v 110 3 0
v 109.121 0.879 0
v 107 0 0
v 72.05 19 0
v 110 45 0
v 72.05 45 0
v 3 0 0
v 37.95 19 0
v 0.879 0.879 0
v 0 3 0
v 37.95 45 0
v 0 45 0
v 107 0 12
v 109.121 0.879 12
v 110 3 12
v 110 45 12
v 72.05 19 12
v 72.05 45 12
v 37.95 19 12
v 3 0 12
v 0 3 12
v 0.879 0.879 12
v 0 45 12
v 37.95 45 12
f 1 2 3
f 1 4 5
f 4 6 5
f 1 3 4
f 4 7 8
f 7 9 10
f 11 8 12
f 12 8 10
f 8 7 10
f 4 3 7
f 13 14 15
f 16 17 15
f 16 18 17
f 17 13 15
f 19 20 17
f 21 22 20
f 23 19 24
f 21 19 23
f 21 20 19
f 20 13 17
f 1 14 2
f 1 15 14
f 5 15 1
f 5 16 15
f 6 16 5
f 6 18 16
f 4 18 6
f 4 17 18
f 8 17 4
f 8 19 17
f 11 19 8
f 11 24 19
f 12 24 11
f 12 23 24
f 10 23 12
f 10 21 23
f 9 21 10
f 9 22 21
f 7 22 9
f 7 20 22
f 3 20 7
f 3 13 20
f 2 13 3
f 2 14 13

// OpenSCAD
$fn = 32;

// ----------------------------------------------------------------------
// Window plate: 110 x 45 mm, 1 open windows
// ----------------------------------------------------------------------

// --- parameters (mm) ---
profile_height = 12;      // extrusion height
profile_points = 12;      // points of the closed outline

profile = [[0, 3], [0.879, 0.879], [3, 0], [107, 0], [109.121, 0.879], [110, 3], [110, 45], [72.05, 45], [72.05, 19], [37.95, 19], [37.95, 45], [0, 45]];  // single closed polygon, 12 points, counter clockwise

// --- the one profile operation ---
linear_extrude(height = profile_height) polygon(points = profile);
